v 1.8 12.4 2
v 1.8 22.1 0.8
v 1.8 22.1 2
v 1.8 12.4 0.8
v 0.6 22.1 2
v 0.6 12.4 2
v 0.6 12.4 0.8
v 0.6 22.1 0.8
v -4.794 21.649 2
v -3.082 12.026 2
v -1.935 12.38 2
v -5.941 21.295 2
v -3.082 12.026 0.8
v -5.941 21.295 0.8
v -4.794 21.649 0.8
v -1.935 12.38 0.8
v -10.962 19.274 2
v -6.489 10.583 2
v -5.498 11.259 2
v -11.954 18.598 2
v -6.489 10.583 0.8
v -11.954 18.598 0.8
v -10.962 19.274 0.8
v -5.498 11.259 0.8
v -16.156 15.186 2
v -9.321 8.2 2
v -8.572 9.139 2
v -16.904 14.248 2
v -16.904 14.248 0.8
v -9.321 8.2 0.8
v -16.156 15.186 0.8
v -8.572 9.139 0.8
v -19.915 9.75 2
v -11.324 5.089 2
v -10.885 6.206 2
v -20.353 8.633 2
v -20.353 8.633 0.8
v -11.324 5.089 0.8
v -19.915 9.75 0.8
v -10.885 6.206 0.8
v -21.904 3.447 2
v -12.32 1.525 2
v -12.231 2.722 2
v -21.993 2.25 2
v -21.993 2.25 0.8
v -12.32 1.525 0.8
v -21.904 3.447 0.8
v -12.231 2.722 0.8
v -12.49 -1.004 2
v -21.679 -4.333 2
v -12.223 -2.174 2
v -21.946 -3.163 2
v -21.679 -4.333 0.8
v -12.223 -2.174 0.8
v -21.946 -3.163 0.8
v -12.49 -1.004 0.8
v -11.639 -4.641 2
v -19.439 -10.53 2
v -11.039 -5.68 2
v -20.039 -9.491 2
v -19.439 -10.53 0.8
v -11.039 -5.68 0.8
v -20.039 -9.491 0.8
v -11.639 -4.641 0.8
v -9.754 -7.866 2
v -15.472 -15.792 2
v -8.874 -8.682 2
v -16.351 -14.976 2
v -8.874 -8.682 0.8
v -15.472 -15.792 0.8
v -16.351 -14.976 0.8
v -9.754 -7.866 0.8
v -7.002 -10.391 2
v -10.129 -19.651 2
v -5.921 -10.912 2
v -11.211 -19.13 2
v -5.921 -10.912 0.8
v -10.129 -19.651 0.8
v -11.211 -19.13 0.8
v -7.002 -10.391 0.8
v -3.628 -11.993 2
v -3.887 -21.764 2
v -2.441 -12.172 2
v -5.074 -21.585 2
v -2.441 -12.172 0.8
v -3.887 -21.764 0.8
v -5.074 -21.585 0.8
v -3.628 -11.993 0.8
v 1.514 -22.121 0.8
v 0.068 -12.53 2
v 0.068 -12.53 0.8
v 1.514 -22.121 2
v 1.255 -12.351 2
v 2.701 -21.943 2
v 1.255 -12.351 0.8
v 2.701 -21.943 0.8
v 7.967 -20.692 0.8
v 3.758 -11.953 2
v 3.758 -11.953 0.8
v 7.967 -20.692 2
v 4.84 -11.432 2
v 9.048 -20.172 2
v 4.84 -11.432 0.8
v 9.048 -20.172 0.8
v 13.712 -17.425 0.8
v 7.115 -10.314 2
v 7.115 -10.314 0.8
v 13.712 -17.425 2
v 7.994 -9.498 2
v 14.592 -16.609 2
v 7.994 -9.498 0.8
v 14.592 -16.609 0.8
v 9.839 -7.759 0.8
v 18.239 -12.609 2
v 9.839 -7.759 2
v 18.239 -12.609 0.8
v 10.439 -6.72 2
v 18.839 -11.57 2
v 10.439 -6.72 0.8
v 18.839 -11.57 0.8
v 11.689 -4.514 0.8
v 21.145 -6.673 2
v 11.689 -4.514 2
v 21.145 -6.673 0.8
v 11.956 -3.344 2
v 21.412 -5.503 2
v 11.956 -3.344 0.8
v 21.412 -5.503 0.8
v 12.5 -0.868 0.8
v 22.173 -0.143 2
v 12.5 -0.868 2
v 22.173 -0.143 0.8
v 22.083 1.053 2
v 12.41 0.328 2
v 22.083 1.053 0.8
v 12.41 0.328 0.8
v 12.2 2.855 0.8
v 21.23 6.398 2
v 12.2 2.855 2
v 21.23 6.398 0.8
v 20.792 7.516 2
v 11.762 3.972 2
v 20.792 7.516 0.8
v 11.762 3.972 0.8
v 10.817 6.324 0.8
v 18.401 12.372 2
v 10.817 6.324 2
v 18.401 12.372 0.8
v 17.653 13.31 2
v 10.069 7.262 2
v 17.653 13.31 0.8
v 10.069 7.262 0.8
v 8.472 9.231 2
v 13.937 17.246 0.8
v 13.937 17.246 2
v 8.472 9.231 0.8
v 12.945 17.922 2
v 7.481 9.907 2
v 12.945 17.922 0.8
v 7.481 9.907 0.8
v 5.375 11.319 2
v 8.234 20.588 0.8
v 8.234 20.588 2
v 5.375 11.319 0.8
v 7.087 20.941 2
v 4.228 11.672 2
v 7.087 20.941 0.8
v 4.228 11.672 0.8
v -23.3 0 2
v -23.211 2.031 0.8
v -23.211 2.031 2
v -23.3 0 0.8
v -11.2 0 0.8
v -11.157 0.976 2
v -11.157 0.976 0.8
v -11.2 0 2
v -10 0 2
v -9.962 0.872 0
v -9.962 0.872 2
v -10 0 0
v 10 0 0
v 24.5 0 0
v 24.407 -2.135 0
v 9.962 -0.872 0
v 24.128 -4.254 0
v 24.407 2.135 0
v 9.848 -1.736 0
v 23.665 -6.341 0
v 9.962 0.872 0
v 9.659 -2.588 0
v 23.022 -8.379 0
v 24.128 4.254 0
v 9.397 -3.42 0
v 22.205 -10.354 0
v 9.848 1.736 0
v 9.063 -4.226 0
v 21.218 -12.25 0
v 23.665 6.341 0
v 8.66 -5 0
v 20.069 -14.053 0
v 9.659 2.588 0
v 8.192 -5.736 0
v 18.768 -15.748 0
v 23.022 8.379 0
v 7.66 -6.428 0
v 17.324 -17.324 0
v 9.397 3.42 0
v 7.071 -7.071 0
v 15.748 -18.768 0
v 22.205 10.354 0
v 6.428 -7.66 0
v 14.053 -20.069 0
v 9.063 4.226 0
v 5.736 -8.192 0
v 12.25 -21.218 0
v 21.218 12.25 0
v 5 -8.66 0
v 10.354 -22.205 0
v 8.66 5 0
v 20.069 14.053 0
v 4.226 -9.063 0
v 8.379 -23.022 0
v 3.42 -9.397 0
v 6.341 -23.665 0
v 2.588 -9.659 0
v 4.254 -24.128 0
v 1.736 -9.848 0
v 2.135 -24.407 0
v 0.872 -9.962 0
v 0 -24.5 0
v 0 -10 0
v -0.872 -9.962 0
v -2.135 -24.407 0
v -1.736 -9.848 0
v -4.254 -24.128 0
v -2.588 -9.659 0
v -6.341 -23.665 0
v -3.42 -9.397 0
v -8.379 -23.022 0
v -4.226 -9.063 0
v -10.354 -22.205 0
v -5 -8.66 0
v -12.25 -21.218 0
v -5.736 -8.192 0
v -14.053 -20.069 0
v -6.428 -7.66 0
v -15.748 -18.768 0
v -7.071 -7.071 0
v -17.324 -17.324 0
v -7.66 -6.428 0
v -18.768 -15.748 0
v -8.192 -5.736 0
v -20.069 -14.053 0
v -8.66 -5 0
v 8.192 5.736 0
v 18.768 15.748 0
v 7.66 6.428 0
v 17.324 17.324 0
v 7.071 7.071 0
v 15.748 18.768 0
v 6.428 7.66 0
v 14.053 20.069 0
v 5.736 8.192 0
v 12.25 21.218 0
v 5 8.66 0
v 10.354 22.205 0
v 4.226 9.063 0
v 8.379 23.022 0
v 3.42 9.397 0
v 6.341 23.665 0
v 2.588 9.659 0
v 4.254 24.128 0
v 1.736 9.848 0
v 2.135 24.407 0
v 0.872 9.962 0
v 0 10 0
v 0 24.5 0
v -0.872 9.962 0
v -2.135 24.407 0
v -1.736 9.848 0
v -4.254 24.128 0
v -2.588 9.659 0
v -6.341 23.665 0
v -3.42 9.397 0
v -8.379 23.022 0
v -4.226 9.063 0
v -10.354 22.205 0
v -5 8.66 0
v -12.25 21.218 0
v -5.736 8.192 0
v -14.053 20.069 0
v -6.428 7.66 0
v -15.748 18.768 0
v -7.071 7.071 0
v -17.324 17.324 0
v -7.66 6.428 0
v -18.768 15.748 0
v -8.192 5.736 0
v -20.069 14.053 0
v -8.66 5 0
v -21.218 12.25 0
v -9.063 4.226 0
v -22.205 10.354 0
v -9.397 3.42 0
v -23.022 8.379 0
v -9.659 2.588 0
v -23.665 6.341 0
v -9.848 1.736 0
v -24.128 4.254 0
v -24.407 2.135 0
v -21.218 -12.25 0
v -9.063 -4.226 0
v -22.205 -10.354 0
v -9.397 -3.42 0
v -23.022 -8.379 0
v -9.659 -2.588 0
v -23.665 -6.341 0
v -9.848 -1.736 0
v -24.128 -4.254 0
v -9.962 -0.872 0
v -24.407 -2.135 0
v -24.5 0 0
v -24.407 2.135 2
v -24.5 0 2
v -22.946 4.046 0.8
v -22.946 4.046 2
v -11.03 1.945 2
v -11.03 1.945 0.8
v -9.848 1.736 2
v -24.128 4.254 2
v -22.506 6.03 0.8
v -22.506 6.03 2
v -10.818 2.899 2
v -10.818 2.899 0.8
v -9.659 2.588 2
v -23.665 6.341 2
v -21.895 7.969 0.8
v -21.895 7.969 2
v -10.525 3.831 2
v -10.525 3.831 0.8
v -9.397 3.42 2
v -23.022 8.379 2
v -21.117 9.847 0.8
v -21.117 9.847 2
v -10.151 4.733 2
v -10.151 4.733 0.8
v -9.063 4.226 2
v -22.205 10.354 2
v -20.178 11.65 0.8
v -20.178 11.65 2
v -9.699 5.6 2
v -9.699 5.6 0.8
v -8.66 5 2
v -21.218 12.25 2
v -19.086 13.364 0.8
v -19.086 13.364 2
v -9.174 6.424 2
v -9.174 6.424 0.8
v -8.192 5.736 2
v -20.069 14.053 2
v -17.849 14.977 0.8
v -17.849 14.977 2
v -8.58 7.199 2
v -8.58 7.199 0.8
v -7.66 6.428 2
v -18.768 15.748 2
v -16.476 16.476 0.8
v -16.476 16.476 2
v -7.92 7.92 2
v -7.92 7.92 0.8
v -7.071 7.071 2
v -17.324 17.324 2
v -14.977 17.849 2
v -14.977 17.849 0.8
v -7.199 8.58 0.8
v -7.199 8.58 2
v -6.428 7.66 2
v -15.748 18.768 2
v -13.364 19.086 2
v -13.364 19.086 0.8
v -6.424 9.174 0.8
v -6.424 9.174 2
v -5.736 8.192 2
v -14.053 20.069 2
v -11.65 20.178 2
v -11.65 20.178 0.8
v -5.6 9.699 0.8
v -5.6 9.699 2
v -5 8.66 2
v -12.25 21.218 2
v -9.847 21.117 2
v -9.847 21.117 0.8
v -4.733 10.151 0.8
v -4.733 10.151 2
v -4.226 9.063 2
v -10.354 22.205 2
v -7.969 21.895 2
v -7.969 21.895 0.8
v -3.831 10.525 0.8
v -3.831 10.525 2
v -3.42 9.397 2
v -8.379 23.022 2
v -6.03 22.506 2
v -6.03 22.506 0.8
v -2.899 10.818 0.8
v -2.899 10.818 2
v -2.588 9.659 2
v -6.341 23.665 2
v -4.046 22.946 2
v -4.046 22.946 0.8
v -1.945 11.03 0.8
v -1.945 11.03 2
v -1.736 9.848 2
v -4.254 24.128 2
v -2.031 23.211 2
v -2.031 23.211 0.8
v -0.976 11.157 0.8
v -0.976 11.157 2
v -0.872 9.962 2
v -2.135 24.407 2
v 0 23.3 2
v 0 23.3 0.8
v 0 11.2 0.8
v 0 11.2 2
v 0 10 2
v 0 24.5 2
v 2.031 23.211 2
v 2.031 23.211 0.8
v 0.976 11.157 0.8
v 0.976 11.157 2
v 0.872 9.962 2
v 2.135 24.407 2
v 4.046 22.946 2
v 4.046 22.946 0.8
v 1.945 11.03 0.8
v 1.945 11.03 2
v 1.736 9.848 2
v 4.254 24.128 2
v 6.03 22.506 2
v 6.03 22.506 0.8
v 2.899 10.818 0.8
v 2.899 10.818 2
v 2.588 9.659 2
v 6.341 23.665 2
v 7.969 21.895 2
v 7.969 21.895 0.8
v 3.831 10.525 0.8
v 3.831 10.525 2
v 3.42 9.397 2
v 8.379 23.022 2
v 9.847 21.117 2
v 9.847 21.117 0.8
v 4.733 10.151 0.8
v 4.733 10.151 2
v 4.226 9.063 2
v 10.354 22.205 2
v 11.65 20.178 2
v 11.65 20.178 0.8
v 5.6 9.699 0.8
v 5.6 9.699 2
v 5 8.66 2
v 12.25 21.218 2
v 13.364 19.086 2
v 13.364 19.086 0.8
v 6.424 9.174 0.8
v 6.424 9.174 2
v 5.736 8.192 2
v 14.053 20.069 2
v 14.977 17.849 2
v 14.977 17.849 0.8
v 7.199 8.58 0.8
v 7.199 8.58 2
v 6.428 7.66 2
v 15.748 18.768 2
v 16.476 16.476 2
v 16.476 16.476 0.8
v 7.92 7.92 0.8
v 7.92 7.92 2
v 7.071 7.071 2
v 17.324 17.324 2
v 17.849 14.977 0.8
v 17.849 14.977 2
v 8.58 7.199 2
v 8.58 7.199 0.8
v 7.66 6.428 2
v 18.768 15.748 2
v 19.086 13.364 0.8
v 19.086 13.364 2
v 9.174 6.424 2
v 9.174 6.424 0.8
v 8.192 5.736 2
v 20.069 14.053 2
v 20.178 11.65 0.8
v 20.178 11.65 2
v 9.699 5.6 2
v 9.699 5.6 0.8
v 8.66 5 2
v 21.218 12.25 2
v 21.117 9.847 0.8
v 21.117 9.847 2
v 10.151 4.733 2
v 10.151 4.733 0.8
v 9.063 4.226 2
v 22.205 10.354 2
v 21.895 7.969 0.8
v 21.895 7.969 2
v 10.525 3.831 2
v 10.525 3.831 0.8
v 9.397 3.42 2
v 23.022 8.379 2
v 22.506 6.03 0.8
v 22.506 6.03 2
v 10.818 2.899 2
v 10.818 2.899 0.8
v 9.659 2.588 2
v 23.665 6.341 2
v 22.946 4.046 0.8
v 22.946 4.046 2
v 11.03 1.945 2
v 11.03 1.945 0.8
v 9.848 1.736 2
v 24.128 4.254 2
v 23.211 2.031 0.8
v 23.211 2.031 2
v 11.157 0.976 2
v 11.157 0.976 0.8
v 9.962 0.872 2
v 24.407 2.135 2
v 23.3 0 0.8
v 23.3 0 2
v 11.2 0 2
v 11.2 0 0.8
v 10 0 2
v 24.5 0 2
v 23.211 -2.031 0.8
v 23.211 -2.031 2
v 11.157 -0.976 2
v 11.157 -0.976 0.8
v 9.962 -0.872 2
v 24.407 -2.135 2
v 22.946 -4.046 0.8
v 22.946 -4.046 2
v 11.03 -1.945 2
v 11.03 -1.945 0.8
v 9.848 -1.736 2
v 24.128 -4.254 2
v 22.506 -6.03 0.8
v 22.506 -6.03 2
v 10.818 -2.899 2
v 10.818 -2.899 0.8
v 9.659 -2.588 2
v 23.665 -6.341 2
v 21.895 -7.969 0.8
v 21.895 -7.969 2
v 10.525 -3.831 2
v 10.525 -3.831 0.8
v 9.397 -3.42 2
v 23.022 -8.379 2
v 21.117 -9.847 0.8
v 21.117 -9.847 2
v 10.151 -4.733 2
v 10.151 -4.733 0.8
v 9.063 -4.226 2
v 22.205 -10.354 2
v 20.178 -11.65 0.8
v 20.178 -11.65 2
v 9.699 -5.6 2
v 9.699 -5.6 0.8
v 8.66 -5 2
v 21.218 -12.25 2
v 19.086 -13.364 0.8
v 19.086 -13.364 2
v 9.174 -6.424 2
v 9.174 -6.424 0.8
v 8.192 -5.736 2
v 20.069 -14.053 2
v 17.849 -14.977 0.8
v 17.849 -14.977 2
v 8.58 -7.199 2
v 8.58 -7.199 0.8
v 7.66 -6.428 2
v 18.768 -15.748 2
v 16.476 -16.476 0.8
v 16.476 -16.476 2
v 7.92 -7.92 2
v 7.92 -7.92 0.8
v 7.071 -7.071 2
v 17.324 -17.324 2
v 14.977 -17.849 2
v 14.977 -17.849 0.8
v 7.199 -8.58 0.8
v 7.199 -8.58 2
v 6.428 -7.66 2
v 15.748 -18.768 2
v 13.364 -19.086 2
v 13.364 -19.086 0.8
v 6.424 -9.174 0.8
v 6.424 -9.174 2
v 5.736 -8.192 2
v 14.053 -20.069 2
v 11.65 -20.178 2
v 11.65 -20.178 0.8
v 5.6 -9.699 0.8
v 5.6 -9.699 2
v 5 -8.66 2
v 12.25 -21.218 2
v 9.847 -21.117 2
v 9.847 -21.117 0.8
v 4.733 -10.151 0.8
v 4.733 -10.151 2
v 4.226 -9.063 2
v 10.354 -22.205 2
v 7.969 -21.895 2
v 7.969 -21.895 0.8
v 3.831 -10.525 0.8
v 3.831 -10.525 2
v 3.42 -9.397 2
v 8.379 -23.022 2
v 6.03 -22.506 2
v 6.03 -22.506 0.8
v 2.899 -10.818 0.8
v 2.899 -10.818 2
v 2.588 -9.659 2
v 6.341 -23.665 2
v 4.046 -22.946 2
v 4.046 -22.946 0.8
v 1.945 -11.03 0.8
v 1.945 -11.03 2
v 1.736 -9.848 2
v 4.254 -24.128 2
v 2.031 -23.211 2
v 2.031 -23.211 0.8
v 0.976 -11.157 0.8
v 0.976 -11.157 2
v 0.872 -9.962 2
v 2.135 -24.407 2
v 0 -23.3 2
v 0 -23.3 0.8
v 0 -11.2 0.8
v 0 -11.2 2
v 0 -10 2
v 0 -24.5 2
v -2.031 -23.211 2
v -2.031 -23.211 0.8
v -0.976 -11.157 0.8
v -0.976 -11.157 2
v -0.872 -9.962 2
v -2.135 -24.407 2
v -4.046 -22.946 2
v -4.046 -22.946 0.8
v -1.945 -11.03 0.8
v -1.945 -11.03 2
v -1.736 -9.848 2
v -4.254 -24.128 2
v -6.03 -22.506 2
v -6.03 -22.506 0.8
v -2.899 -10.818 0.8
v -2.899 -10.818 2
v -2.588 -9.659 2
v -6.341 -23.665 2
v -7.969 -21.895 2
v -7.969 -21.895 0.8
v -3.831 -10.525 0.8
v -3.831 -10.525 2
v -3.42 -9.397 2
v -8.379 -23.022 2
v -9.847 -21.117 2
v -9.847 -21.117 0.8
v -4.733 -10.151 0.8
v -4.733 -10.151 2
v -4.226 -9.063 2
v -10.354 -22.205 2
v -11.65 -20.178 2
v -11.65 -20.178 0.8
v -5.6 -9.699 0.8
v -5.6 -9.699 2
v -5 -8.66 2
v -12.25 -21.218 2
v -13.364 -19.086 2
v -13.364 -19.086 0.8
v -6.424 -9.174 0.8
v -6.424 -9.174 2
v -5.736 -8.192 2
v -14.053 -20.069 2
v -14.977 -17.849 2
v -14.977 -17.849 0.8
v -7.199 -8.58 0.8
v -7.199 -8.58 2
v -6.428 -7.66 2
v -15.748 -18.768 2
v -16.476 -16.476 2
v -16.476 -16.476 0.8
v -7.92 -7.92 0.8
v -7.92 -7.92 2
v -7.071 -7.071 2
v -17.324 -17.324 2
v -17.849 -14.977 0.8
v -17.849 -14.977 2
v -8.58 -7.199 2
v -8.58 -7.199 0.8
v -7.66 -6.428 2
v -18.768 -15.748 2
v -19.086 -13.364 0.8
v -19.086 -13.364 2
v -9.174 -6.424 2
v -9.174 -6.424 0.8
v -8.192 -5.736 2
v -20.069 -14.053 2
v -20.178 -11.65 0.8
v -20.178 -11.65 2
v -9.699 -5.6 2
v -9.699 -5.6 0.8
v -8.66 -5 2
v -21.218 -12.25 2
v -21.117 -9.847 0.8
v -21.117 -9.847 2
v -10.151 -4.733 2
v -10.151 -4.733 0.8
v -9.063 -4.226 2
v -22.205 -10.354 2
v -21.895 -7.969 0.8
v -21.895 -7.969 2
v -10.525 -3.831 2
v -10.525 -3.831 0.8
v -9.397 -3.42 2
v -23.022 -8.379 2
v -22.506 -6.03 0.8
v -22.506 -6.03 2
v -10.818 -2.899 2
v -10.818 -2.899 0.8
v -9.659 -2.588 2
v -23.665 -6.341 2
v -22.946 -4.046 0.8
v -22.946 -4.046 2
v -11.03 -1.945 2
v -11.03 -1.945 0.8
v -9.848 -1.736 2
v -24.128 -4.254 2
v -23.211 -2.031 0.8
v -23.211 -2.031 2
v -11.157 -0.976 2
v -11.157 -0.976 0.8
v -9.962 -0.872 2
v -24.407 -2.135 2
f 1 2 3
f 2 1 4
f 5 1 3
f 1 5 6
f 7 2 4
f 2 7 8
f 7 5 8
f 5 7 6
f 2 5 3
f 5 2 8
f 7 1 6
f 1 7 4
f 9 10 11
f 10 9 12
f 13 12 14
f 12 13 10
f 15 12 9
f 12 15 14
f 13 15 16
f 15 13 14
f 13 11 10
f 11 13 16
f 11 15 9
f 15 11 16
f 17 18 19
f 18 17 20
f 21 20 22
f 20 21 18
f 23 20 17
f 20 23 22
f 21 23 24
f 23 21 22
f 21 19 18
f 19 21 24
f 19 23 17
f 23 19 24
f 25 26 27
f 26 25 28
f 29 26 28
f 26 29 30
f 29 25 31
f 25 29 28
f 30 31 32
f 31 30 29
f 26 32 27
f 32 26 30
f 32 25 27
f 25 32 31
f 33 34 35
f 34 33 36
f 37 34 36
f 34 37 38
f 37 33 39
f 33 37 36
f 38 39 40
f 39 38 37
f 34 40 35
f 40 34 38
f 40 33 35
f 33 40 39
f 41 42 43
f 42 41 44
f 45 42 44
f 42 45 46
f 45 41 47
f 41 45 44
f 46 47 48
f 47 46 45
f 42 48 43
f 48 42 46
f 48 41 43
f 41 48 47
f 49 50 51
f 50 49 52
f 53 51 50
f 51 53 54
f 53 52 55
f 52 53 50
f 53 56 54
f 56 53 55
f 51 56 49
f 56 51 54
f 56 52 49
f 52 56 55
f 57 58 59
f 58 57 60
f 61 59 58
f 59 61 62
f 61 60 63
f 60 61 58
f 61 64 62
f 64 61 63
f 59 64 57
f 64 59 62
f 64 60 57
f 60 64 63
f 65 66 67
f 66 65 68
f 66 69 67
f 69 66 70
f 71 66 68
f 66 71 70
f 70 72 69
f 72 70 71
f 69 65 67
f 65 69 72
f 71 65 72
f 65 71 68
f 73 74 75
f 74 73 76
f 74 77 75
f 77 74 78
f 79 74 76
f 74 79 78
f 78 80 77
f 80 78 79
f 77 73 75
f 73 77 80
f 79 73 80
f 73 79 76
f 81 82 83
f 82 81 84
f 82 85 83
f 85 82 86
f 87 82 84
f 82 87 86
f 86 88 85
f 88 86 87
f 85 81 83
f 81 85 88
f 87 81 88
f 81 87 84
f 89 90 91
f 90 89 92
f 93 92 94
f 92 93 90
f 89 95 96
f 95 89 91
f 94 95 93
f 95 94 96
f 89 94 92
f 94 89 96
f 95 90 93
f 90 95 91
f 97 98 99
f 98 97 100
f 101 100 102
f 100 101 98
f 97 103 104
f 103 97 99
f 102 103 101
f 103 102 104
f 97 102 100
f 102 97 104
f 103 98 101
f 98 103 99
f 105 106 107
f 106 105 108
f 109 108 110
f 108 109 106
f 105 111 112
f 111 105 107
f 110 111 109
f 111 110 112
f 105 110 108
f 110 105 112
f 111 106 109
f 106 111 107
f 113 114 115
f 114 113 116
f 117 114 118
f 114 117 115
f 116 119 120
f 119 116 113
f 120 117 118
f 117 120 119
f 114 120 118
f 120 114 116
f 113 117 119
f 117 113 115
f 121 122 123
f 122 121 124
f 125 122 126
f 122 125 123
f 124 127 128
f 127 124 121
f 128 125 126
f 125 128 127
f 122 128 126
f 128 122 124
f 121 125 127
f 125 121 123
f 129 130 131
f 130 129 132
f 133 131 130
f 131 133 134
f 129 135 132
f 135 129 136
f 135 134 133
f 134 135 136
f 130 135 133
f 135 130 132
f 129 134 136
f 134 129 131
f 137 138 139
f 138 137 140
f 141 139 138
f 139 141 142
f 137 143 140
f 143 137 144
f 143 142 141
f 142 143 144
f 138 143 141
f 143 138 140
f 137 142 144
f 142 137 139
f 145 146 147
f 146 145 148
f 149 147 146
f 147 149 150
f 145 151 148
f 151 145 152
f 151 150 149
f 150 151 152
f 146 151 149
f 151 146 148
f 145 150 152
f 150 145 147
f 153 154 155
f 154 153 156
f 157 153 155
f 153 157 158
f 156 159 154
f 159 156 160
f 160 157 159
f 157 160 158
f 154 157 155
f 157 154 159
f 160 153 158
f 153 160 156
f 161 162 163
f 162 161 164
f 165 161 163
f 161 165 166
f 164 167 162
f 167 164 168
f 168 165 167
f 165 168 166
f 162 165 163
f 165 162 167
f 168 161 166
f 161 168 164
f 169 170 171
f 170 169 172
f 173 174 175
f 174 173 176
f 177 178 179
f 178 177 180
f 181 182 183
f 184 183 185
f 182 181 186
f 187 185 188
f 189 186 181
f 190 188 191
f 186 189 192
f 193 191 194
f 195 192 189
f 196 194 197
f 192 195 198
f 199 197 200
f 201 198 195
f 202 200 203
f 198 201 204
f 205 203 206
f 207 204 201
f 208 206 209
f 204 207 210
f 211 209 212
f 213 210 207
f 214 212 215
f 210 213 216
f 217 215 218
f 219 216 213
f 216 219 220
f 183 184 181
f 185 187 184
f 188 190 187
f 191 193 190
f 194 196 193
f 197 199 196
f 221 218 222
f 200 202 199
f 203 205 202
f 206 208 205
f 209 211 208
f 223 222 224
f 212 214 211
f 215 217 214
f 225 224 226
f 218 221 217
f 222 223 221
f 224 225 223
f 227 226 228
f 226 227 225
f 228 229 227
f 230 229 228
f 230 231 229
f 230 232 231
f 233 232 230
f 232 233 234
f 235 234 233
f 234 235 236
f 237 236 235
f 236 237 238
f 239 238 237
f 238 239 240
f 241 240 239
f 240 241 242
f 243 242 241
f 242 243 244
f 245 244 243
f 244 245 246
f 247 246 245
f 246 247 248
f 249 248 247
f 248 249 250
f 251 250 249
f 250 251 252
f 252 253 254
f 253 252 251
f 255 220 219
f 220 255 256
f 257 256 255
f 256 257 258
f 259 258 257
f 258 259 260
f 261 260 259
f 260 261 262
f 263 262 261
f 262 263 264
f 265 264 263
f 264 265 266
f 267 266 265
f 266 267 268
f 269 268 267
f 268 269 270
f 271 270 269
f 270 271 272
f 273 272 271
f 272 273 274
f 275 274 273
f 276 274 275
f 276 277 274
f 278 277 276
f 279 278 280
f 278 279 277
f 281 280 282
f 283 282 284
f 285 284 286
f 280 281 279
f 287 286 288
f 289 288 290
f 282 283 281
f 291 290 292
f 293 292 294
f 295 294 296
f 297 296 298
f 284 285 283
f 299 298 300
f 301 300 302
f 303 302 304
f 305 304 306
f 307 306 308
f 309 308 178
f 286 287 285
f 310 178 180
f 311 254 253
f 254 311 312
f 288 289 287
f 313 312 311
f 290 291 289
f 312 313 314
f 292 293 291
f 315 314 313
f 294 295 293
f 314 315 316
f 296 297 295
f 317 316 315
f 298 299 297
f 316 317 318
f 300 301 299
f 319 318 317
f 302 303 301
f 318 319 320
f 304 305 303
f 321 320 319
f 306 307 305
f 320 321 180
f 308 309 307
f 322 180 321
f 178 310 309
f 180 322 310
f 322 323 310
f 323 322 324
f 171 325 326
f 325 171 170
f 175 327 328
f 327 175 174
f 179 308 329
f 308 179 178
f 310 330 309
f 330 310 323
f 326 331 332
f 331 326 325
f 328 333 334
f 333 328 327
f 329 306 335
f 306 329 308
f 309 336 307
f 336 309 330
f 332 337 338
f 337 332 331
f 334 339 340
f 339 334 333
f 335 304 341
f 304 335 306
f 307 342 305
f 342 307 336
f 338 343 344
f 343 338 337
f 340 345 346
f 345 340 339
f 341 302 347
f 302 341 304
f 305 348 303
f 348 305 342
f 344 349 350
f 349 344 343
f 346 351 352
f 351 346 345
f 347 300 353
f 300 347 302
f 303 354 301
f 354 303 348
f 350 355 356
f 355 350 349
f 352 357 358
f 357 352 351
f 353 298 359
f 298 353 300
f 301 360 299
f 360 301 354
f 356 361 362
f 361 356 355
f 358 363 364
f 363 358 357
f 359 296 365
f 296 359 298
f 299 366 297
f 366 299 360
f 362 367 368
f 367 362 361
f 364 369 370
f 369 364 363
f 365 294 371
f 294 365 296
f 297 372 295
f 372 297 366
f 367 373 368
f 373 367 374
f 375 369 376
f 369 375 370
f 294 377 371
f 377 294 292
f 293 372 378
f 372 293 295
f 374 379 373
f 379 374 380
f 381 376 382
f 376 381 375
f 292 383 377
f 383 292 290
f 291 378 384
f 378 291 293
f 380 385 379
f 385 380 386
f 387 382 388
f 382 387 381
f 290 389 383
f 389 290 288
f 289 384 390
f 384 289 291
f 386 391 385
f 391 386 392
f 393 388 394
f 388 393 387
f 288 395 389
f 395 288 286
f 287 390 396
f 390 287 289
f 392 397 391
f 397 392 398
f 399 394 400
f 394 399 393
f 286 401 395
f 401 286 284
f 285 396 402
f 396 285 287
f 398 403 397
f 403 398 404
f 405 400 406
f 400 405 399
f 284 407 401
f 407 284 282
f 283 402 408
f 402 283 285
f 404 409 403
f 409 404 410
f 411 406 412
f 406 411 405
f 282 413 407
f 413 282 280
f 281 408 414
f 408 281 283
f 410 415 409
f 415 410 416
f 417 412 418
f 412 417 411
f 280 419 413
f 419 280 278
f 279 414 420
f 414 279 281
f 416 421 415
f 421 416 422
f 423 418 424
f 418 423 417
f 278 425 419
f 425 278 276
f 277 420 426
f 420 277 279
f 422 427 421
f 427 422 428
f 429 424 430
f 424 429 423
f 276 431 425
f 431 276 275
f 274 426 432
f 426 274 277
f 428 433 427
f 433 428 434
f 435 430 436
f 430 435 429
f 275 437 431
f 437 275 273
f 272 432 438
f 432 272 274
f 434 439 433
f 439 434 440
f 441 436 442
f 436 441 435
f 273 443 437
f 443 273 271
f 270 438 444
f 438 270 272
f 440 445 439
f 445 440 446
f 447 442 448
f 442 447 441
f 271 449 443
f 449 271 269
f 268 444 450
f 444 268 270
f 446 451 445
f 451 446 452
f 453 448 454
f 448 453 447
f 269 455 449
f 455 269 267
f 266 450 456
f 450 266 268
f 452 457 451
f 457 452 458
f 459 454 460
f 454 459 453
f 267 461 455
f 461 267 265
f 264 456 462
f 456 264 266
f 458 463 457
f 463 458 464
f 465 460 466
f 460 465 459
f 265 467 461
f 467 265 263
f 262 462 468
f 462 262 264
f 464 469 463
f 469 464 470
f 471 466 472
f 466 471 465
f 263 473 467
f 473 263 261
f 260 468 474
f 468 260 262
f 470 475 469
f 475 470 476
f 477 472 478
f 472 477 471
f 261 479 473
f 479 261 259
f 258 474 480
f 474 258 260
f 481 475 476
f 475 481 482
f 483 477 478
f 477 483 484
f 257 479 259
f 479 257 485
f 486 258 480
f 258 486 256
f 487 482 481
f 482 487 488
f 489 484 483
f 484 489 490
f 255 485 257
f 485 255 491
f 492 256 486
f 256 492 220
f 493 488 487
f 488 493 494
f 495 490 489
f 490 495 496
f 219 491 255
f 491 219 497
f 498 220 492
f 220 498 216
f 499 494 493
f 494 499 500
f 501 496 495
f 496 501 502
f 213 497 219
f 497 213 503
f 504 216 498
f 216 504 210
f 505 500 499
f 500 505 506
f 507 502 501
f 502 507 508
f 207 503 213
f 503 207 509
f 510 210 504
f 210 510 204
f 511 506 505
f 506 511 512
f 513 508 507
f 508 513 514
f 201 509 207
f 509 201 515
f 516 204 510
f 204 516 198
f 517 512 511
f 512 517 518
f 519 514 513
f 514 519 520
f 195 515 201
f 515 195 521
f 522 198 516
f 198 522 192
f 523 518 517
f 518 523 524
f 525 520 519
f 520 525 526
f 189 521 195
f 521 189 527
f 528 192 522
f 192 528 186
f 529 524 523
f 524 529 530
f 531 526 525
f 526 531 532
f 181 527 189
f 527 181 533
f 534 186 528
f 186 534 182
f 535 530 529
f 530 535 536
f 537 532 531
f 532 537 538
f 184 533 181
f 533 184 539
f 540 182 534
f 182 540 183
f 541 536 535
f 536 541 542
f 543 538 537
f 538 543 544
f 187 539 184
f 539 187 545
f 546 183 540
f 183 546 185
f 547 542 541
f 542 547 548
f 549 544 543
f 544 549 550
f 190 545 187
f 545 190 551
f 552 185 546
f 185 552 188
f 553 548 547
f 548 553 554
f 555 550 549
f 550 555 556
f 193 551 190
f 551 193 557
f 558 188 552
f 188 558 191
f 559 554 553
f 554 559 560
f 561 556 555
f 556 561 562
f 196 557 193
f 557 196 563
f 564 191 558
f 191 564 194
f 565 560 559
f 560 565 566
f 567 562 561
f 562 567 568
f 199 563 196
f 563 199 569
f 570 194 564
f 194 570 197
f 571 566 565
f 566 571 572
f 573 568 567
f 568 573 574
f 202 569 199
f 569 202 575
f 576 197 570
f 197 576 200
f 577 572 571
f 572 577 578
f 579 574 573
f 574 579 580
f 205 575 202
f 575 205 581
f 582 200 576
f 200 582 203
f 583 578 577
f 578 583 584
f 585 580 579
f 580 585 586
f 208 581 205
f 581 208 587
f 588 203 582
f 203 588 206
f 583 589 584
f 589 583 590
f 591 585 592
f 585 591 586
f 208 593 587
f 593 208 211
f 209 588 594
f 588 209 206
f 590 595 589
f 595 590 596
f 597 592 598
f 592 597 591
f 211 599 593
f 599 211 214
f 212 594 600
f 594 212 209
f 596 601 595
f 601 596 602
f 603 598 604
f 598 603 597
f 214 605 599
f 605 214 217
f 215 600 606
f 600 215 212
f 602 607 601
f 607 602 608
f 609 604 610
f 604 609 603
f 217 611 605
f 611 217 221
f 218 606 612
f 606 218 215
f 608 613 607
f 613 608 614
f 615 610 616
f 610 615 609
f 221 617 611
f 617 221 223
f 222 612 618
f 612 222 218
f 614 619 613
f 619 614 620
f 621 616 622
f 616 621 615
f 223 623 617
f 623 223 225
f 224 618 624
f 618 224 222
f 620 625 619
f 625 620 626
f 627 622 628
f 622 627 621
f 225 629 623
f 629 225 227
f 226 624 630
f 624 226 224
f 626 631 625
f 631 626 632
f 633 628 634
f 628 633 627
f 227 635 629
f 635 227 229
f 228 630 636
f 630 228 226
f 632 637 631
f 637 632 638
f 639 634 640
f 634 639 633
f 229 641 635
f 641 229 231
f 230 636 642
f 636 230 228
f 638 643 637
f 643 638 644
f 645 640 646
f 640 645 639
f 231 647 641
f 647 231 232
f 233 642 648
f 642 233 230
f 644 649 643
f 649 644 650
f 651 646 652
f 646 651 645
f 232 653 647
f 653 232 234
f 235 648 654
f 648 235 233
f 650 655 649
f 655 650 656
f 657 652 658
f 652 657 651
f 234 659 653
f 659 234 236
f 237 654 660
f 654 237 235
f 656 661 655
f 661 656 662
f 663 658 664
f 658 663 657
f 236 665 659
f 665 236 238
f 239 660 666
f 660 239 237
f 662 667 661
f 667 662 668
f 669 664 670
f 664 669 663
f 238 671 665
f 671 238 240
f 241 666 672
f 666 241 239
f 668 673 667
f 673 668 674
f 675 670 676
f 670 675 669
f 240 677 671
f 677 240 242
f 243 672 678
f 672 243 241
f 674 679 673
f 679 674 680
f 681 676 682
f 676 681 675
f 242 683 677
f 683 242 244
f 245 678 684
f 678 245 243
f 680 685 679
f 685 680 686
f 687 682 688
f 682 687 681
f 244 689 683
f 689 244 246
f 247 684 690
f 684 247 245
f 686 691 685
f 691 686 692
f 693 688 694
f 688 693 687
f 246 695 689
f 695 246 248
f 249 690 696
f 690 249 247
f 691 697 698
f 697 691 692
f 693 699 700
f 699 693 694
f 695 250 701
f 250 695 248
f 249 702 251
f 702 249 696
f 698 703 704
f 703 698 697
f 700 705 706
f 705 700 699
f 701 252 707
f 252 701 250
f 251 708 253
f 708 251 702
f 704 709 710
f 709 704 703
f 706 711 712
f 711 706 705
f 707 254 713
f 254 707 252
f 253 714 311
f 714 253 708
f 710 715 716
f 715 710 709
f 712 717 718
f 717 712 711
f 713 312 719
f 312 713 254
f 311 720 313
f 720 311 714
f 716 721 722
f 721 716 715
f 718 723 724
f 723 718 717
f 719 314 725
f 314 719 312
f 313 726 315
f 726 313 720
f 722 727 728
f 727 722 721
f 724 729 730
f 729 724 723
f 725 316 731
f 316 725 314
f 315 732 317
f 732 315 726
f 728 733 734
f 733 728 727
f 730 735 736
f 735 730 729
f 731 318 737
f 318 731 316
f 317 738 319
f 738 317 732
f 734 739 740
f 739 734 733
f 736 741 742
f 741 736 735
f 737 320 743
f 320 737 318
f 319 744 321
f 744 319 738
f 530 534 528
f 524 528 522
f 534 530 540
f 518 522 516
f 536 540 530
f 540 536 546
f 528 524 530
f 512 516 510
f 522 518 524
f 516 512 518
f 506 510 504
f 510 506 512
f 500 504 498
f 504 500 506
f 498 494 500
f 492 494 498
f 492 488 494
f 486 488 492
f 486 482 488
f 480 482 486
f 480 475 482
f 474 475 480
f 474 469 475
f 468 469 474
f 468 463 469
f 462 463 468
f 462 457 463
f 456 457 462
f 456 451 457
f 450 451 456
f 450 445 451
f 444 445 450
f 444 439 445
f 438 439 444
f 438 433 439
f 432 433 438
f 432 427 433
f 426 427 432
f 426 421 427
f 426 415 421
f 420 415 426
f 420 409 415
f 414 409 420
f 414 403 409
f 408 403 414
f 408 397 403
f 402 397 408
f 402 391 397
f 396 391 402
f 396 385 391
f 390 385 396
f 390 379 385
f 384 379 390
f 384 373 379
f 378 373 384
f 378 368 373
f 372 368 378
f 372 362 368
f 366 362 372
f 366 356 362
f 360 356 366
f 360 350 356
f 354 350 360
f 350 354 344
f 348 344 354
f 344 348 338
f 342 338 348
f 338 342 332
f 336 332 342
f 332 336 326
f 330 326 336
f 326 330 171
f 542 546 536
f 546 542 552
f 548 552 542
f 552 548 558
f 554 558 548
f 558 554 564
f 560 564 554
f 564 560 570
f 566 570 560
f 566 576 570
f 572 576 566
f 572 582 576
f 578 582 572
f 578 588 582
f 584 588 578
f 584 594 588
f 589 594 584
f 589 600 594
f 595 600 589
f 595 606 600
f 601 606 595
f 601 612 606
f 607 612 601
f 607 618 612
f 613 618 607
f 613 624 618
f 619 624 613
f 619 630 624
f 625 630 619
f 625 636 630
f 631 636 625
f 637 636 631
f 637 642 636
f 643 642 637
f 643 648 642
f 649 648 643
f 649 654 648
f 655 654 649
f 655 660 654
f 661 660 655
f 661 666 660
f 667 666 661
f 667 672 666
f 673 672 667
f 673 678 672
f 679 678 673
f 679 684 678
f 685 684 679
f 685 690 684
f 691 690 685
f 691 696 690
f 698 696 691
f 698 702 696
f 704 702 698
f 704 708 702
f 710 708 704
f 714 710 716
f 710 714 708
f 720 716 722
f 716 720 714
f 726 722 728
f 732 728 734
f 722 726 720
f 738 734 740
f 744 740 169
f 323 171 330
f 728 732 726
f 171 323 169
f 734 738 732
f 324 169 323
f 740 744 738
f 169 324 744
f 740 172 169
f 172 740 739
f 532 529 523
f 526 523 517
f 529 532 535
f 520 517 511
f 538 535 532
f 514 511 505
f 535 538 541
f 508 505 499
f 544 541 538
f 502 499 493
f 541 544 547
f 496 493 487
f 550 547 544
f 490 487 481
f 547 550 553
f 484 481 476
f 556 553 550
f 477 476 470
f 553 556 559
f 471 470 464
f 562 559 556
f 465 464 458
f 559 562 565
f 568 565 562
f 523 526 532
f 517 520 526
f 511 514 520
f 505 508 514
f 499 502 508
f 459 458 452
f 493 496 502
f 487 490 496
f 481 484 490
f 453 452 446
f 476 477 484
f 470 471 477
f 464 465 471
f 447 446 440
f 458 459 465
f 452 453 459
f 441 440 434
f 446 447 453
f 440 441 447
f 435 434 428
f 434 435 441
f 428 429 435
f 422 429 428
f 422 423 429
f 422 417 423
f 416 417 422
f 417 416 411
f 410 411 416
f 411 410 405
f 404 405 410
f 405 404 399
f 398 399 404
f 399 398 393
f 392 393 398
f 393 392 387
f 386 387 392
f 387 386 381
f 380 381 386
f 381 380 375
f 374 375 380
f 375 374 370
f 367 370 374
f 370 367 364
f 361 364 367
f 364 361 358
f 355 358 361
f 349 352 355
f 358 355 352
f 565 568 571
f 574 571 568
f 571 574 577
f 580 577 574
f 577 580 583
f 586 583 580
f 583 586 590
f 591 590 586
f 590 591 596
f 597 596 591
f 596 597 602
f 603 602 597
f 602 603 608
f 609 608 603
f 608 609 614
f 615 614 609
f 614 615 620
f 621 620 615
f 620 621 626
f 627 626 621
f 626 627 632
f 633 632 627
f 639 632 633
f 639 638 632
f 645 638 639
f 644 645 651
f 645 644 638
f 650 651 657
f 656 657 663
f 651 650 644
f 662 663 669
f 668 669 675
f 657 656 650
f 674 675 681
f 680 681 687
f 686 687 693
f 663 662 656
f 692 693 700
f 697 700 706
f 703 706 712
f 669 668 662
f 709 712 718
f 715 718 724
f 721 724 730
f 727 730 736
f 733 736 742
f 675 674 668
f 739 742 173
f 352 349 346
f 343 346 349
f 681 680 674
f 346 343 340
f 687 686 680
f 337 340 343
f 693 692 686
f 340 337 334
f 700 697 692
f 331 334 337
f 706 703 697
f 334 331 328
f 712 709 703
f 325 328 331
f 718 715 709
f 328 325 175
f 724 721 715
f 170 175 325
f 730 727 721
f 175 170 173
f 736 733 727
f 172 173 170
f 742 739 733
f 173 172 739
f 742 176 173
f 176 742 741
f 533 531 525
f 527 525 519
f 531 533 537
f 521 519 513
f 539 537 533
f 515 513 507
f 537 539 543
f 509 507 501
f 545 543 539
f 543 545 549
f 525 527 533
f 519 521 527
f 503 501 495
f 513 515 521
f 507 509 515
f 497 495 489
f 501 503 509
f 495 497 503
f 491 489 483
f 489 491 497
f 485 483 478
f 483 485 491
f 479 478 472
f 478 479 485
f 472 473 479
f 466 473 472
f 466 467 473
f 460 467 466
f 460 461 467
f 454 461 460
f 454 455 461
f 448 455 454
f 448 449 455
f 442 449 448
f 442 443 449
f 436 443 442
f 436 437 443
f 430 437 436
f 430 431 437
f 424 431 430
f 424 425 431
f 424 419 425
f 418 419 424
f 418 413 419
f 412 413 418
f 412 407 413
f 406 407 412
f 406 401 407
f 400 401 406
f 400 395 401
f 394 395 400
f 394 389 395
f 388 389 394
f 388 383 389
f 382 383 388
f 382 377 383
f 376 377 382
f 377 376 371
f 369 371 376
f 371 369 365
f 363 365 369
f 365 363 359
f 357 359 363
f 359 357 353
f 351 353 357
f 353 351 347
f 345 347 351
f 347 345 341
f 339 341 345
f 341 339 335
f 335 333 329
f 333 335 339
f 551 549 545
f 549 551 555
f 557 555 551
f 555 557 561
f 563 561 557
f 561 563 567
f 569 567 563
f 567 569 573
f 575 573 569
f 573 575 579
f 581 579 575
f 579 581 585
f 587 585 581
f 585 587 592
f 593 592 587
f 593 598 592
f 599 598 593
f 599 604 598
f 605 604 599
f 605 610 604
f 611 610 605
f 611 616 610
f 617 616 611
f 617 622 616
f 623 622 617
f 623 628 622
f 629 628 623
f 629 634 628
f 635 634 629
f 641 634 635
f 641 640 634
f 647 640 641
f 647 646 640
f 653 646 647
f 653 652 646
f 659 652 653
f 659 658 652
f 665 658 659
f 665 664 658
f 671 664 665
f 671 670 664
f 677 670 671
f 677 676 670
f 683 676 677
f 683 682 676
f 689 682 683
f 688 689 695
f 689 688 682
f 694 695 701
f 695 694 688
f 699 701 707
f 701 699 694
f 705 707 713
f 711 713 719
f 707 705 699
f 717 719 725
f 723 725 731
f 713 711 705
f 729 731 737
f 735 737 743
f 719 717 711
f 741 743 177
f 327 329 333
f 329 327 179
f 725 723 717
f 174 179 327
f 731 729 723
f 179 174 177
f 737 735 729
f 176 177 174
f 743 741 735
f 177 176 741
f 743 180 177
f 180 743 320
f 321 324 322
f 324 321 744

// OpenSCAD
// -*- mode: SCAD ; c-file-style: "ellemtel" ; coding: utf-8 -*-
//
// A ring coaster
//
// copyright 2017 -- 2018 Roland Sieker <ospalh@gmail.com>
// Licence: CC-BY-SA 4.0


// Size of the coaster's hole (mm)
inner_diameter = 20;  // [10:1:90]
// Size of the coaster as a whole (mm)
outer_diameter = 49;  // [20:1:100]

// Set this to "render" and click on "Create Thing" when done with the setup.
preview = 1; // [0:render, 1:preview]


/* [Hidden] */

// Done with the customizer


// These can be changed reasonably safely

h = 1.2;
b = 0.8;
w = 1.2;
sl_m = 13;
g = 2*w;

// You should know what you are doing when you change these:
r_i = inner_diameter/2;
r_o = outer_diameter/2;
r_is = r_i + 2*w;
r_os = r_o - 2*w;
sl_t = min(sl_m, r_is);
nsr = ceil((r_os-r_is)/sl_t);
sl_e = (r_os-r_is) / nsr;
ms = 0.01;  // Muggeseggele.

// fn for differently sized objects and fs, fa; all for preview or rendering.
pna = 40;
pnb = 15;
pa = 5;
ps = 1;
rna = 180;
rnb = 30;
ra = 1;
rs = 0.1;
function na() = (preview) ? pna : rna;
function nb() = (preview) ? pnb : rnb;
$fs = (preview) ? ps : rs;
$fa = (preview) ? pa : ra;

// Pi is wrong.
tau = 2*PI;


// Done with setup. Now create the thing

ring_coaster();

// The real code

module ring_coaster()
{
   dish();
   for (r_ie=[r_is:sl_e:r_os-ms])
   {
      stegring(r_ie, sl_e);
   }
}



module dish()
{
   ts = [
      [r_i, 0],
      [r_o, 0],
      [r_o, h+b],
      [r_o-w, h+b],
      [r_o-w, b],
      [r_i+w, b],
      [r_i+w, h+b],
      [r_i, h+b],
      ];

   rotate_extrude()
   {
      polygon(ts);
   }
}



module stegring(r_ir, sl)
{
   stege = floor(r_ir * tau / (w+g));
   winkel = 360/stege;

   for (a = [0:winkel:360-0.001])
   {
      rotate(a)
      {
         translate([w/2, r_ir, b])
         {
            cube([w, sl ,h]);
         }
      }
   }
}
